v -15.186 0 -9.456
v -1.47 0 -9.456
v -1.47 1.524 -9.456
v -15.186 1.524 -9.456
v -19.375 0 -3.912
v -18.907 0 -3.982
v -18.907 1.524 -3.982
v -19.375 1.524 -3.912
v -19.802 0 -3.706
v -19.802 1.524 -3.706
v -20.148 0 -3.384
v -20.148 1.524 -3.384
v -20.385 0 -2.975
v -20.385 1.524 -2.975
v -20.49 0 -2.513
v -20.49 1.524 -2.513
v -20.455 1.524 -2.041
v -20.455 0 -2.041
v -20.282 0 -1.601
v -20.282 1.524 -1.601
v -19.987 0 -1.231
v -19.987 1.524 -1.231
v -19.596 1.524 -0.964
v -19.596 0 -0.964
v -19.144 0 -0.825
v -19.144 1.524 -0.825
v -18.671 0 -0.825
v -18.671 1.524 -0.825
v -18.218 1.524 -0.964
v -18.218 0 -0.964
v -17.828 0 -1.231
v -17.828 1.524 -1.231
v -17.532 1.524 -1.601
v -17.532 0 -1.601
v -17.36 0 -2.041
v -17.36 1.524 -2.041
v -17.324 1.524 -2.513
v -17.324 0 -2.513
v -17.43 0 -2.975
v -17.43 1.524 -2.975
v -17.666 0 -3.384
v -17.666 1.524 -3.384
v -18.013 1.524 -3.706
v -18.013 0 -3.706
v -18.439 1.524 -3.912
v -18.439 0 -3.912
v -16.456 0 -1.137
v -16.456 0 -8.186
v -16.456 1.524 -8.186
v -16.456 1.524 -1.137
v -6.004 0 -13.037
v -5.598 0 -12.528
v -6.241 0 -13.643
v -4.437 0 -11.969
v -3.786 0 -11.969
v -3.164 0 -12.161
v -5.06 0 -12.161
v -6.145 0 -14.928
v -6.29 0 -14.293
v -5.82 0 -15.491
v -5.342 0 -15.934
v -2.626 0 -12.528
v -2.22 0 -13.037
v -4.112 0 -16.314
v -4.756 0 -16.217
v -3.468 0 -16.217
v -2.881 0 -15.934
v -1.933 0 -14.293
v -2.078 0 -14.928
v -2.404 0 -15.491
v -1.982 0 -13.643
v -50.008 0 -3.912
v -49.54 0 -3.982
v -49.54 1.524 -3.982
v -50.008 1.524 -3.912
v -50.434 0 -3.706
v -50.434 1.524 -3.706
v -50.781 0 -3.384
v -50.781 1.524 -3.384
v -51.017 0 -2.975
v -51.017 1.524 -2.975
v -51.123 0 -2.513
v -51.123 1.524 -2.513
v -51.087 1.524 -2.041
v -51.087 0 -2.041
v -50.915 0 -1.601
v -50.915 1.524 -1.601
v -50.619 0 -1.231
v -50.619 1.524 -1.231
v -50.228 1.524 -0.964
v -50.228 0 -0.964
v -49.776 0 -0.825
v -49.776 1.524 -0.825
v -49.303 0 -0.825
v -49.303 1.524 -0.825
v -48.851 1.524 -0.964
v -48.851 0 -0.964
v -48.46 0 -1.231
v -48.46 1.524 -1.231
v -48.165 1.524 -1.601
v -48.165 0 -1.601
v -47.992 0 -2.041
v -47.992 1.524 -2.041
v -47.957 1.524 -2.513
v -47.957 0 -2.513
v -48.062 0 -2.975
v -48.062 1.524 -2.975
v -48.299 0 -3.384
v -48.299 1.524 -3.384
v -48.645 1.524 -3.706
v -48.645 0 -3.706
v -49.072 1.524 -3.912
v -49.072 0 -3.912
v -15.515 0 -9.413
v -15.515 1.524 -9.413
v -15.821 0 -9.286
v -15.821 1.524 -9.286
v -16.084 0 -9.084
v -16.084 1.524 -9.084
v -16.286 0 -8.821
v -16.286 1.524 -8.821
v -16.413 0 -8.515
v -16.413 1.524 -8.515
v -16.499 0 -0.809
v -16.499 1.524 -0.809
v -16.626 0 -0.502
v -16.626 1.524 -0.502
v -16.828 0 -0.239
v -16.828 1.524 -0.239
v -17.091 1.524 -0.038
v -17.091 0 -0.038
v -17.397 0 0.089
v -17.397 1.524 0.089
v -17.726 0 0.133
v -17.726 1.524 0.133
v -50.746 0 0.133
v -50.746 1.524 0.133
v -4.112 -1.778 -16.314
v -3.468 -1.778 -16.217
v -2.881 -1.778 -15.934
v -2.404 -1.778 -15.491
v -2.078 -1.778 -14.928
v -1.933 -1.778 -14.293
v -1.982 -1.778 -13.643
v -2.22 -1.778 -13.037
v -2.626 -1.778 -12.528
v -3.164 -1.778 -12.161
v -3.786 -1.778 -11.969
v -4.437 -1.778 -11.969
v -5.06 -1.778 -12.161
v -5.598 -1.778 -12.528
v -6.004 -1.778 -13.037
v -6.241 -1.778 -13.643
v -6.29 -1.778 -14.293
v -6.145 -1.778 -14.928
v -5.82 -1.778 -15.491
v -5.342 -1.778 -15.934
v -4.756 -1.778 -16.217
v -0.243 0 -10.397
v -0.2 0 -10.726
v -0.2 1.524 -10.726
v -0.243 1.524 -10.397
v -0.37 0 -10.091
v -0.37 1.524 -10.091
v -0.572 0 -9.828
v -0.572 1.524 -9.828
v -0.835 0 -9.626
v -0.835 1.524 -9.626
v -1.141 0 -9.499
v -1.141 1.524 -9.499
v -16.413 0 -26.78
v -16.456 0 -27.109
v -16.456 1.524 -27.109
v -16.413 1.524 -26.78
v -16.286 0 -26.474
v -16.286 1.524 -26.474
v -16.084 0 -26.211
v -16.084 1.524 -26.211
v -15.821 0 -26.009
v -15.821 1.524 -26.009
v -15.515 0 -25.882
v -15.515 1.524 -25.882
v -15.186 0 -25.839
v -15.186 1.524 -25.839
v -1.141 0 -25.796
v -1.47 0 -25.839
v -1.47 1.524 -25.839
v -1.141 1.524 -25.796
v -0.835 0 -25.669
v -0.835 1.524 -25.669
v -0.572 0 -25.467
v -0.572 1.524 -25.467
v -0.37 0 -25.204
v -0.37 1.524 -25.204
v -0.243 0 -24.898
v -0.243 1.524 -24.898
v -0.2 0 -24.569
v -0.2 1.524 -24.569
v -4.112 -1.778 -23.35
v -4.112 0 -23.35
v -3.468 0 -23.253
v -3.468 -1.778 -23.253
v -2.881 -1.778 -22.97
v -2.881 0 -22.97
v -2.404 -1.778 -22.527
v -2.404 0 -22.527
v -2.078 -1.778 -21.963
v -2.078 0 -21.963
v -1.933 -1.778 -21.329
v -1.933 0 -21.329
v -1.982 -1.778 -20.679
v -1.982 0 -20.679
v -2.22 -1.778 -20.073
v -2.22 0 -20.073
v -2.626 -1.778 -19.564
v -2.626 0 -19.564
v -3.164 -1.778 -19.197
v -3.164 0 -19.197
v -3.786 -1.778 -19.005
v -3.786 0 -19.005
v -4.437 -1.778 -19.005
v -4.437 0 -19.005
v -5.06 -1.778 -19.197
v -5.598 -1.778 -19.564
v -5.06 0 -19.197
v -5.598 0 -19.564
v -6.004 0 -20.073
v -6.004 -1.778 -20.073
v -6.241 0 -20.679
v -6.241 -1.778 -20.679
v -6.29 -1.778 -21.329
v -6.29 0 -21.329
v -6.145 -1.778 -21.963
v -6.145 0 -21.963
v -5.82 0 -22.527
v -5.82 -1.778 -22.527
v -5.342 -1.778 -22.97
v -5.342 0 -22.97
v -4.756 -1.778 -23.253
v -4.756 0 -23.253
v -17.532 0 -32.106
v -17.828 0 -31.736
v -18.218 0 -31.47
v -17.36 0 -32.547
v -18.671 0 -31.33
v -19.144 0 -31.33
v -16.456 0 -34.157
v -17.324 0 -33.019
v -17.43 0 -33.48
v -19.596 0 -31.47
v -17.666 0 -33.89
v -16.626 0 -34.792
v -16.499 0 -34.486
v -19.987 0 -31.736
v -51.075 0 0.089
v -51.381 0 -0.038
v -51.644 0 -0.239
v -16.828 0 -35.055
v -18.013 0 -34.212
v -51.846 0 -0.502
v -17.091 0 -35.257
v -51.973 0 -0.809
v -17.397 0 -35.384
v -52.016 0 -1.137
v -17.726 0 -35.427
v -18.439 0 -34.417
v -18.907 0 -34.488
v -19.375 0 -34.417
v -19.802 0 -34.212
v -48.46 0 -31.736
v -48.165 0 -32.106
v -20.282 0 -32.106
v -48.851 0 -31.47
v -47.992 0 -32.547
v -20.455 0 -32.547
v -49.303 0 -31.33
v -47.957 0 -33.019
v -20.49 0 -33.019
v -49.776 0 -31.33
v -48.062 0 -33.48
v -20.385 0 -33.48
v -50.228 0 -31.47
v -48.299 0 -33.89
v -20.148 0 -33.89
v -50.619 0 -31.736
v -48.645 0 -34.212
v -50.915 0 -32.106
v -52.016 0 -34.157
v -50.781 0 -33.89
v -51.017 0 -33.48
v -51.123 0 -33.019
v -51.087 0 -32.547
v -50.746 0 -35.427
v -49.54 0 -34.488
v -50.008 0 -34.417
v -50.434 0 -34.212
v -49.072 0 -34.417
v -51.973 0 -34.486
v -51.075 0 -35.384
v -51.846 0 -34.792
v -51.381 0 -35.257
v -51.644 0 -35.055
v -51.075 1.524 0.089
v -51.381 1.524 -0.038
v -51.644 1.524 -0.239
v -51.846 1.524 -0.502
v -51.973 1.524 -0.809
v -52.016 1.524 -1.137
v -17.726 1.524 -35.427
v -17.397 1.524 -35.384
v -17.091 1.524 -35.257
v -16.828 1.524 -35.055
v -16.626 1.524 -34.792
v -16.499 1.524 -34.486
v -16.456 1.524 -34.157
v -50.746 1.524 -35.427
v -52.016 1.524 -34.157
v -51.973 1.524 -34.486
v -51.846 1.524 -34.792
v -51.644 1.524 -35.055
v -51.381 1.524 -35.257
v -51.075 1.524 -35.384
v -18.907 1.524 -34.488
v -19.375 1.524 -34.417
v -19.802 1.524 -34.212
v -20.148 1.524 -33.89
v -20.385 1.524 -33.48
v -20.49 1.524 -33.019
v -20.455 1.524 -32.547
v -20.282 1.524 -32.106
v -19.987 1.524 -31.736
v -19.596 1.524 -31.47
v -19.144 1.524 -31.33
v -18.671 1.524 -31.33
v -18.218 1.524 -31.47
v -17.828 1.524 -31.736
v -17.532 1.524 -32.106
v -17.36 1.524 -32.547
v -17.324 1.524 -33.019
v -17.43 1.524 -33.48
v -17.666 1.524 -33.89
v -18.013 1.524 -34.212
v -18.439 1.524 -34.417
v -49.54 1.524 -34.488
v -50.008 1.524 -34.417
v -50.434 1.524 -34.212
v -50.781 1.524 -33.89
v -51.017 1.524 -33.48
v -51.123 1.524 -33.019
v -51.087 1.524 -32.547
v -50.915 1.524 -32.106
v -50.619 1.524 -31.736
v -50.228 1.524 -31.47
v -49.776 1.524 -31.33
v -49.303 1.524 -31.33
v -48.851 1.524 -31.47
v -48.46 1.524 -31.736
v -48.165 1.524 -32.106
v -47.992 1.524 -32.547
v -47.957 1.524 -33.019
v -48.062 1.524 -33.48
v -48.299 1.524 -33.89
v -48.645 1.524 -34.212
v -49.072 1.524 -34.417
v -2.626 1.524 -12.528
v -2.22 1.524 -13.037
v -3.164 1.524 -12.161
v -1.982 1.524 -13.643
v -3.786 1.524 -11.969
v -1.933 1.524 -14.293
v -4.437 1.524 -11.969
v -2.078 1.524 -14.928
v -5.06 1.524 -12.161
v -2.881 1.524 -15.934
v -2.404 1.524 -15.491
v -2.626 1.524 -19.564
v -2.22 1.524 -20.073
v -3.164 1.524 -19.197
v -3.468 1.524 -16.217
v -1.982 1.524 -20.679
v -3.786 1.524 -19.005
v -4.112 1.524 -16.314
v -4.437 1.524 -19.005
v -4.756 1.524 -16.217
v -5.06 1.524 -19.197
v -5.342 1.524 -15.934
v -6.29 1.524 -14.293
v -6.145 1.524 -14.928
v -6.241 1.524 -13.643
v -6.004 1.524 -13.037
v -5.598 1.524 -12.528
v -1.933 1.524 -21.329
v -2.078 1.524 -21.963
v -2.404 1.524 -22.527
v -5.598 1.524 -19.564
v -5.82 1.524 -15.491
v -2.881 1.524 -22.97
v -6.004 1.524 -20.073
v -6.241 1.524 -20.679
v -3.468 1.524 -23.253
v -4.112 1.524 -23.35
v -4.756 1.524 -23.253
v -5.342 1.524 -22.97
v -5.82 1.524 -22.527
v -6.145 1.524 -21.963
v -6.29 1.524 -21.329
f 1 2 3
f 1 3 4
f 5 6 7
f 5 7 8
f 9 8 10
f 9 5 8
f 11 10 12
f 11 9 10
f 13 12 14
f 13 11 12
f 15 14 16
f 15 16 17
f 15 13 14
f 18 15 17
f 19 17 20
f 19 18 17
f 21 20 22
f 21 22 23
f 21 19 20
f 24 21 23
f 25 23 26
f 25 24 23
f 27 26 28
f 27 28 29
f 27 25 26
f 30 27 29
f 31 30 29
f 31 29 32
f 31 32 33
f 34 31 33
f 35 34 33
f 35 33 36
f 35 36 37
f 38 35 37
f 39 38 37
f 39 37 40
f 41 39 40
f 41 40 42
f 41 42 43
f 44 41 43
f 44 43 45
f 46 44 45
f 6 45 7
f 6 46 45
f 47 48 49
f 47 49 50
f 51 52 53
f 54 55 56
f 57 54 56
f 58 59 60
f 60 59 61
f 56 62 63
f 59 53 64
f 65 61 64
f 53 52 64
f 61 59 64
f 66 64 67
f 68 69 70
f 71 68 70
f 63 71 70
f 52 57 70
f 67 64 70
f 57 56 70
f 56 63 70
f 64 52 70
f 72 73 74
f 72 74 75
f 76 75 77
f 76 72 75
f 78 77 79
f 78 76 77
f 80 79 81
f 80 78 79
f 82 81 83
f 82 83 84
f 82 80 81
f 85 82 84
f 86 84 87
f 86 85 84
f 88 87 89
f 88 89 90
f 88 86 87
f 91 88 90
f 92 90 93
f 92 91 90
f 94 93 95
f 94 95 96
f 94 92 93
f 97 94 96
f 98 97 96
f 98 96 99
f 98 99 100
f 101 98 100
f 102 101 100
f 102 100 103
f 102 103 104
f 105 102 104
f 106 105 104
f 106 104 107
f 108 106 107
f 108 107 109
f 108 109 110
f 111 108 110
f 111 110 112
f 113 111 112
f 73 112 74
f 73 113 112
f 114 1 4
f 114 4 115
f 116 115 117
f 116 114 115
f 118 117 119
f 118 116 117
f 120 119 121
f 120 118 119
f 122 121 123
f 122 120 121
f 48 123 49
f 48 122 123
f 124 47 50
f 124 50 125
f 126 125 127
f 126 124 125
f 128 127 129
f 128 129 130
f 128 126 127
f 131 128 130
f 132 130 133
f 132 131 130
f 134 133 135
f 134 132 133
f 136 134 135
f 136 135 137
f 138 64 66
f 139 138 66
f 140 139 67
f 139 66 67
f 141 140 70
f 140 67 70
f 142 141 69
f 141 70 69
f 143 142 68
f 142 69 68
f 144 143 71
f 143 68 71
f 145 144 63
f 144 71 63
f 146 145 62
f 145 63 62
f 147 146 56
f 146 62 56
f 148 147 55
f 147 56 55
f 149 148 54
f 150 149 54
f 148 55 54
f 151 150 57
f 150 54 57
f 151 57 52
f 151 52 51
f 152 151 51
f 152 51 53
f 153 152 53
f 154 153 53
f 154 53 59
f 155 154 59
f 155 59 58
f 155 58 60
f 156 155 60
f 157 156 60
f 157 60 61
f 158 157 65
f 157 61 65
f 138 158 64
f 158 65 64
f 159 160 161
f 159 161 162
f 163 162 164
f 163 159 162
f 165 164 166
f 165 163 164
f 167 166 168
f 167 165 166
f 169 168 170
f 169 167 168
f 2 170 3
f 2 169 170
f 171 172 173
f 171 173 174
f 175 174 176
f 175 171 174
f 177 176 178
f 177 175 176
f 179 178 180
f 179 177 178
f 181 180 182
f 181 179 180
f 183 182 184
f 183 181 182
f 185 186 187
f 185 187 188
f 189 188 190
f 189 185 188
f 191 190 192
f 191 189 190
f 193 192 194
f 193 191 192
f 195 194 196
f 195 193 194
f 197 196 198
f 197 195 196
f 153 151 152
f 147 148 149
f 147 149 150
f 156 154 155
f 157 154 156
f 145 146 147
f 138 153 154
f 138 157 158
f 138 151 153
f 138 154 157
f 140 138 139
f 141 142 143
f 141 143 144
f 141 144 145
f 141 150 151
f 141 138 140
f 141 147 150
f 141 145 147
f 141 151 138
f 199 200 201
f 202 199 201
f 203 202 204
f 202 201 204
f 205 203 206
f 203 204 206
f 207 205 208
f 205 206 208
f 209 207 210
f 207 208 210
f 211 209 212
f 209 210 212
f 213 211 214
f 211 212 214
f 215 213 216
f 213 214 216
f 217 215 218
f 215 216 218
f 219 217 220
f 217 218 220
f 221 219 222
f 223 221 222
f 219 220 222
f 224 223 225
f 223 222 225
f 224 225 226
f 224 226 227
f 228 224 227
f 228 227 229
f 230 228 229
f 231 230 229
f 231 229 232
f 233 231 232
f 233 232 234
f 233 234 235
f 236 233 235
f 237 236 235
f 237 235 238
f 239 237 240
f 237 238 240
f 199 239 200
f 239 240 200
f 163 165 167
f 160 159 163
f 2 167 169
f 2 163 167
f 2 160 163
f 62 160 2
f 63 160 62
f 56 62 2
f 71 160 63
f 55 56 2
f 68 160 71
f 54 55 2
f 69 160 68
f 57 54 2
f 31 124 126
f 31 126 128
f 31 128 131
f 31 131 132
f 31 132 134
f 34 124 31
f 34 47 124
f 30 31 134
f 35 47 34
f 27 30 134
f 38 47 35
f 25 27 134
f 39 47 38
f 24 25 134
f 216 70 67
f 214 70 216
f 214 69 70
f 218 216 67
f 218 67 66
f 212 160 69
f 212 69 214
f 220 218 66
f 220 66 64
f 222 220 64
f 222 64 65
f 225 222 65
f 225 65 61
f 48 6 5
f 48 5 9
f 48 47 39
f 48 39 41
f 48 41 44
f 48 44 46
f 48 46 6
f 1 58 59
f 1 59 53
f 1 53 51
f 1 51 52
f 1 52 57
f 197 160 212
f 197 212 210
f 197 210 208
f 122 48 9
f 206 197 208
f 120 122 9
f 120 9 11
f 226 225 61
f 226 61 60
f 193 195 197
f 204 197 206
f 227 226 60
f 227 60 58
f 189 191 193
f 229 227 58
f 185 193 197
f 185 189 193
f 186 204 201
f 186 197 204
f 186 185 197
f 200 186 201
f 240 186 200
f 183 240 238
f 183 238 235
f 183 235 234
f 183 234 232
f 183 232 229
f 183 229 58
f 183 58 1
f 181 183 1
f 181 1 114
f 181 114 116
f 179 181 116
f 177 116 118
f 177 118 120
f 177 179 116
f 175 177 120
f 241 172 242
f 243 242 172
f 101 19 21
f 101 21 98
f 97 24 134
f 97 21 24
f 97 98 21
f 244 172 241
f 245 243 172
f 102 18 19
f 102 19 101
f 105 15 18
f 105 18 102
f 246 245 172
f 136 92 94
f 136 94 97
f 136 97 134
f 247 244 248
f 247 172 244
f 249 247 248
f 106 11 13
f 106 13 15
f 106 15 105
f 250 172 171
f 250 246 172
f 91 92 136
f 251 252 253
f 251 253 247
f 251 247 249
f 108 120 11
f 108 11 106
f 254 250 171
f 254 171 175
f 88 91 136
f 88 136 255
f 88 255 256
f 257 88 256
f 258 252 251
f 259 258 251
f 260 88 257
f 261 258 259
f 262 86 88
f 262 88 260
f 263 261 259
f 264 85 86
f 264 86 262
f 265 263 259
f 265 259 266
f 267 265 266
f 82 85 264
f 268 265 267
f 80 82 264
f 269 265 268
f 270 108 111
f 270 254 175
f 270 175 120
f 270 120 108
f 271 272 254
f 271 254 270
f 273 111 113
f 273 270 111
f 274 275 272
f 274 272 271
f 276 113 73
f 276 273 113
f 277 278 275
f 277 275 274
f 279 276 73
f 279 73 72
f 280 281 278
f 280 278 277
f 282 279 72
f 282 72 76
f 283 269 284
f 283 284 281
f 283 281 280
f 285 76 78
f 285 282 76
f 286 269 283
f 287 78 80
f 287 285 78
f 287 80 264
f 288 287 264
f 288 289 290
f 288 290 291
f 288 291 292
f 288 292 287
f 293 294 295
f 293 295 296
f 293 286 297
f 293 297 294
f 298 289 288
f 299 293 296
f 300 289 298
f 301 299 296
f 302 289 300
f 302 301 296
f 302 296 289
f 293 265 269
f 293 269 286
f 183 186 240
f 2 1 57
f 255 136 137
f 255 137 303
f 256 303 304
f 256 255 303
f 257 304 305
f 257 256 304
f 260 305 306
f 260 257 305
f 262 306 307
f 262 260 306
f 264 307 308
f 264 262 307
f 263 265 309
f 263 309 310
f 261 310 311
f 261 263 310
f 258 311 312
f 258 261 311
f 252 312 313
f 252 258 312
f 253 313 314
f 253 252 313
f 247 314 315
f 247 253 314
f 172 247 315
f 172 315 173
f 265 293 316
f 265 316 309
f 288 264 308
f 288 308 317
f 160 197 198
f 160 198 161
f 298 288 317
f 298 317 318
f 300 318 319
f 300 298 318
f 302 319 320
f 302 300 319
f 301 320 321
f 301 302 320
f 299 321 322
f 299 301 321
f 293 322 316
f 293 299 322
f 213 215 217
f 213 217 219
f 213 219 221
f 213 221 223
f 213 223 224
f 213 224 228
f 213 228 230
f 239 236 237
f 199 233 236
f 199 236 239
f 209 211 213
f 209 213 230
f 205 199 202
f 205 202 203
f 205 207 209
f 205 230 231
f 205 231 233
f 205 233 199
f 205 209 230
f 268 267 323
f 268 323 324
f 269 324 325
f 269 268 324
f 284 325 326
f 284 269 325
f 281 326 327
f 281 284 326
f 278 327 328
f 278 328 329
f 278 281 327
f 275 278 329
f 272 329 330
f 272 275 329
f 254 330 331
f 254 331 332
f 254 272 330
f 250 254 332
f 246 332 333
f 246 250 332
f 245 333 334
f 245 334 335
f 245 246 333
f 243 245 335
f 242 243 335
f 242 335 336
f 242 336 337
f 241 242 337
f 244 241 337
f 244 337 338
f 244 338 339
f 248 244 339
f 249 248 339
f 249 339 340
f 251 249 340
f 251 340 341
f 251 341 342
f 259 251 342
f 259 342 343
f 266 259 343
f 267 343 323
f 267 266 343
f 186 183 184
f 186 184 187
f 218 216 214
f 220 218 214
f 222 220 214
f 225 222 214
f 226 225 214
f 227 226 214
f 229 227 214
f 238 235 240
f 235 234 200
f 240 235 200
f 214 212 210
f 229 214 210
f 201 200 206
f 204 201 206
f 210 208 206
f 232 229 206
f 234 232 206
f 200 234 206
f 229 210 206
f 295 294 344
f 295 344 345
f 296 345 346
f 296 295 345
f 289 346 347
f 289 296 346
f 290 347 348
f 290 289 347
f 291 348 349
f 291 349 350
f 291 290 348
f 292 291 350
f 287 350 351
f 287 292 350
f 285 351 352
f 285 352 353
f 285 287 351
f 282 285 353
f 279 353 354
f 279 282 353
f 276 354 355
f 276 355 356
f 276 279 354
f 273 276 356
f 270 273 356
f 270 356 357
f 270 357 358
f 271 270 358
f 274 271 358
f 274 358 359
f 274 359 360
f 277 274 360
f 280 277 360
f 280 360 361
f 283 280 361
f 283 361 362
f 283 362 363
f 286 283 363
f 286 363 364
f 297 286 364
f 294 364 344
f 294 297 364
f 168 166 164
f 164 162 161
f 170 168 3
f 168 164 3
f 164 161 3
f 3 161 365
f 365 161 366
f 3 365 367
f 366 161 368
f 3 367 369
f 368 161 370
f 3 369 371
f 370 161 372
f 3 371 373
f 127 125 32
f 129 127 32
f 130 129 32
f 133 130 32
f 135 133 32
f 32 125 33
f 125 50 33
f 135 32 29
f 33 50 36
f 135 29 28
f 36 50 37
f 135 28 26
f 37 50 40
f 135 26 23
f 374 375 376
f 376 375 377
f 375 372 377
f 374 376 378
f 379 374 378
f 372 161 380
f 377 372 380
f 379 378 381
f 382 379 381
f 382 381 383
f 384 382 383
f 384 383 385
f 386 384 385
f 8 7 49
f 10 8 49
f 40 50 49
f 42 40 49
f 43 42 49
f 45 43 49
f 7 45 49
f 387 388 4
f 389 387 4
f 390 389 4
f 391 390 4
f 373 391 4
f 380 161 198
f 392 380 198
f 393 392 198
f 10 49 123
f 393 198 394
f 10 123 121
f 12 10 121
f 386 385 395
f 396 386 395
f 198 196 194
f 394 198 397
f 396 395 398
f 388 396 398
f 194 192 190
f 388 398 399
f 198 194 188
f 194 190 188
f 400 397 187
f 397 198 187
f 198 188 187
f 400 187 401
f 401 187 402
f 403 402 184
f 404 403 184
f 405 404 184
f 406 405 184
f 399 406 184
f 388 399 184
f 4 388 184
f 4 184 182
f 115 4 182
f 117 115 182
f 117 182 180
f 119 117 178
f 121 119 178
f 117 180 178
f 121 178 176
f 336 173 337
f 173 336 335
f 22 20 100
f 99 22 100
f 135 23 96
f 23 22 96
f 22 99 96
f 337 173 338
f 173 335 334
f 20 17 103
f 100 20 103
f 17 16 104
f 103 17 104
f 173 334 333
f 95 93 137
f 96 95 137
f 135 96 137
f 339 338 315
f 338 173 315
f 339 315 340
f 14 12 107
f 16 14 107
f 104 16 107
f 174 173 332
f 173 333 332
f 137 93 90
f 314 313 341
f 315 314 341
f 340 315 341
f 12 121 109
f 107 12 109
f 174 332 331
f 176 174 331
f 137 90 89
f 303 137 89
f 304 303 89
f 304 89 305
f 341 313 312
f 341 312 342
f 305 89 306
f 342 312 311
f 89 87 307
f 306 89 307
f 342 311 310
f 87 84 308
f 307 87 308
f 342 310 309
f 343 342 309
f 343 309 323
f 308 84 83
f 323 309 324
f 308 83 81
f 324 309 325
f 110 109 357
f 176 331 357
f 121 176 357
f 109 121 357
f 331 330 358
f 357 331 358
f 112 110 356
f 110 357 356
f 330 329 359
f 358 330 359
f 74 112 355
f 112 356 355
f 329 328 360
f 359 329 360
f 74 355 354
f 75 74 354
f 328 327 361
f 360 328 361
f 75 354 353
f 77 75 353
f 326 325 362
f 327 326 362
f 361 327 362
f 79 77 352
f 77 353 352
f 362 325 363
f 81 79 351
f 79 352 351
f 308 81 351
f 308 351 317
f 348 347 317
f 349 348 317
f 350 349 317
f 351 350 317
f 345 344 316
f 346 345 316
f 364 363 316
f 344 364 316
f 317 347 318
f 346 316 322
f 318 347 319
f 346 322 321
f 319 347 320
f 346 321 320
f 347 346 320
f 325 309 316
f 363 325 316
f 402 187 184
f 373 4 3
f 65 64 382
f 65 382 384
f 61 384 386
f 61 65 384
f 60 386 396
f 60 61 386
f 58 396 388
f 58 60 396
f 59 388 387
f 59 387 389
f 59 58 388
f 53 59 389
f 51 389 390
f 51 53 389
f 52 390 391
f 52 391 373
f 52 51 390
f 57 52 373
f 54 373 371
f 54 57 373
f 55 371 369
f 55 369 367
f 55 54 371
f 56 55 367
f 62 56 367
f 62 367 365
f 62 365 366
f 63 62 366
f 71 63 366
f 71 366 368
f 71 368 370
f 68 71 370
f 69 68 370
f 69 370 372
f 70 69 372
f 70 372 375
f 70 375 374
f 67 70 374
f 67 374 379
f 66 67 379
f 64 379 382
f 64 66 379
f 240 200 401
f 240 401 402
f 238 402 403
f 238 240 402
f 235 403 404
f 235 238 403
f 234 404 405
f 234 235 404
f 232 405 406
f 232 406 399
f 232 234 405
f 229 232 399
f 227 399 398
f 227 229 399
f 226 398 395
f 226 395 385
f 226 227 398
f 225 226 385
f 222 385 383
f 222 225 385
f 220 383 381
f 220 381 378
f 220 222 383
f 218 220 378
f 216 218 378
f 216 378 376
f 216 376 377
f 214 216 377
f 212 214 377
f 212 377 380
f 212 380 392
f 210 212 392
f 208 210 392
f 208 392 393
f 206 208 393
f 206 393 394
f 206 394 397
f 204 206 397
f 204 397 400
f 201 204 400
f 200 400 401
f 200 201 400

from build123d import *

# Parameters (mm, degrees)
SKETCH1_R             = 1.5875
SKETCH1_R_2           = 2.1844
BOSS_EXTRUDE2_DEPTH   = 1.524
SKETCH3_R             = 2.1844
BOSS_EXTRUDE4_DEPTH   = 1.778
BOSS_EXTRUDE4_2_DEPTH = 1.778


with BuildPart() as part:
    # Sketch1 → Boss-Extrude2 (new body)
    with BuildSketch(Plane(origin=(0, 0, 0), x_dir=(1, 0, 0), z_dir=(0, 1, 0))):
        with BuildLine():
            Line((-50.746188486, 35.427401309), (-17.726188486, 35.427401309))
            ThreePointArc((-17.726188486, 35.427401309), (-16.828162874, 35.055426921), (-16.456188486, 34.157401309))
            Line((-16.456188486, 34.157401309), (-16.456188486, 27.108901309))
            ThreePointArc((-16.456188486, 27.108901309), (-16.084214098, 26.210875697), (-15.186188486, 25.838901309))
            Line((-15.186188486, 25.838901309), (-1.470188486, 25.838901309))
            ThreePointArc((-1.470188486, 25.838901309), (-0.572162874, 25.466926921), (-0.200188486, 24.568901309))
            Line((-0.200188486, 24.568901309), (-0.200188486, 10.725901309))
            ThreePointArc((-0.200188486, 10.725901309), (-0.572162874, 9.827875697), (-1.470188486, 9.455901309))
            Line((-1.470188486, 9.455901309), (-15.186188486, 9.455901309))
            ThreePointArc((-15.186188486, 9.455901309), (-16.084214098, 9.083926921), (-16.456188486, 8.185901309))
            Line((-16.456188486, 8.185901309), (-16.456188486, 1.137401309))
            ThreePointArc((-16.456188486, 1.137401309), (-16.828162874, 0.239375697), (-17.726188486, -0.132598691))
            Line((-17.726188486, -0.132598691), (-50.746188486, -0.132598691))
            ThreePointArc((-50.746188486, -0.132598691), (-51.644214098, 0.239375697), (-52.016188486, 1.137401309))
            Line((-52.016188486, 1.137401309), (-52.016188486, 34.157401309))
            ThreePointArc((-52.016188486, 34.157401309), (-51.644214098, 35.055426921), (-50.746188486, 35.427401309))
        make_face()
        with Locations(Location((-49.539688486, 32.900101309, 0), (0, 0, 90))):
            Circle(SKETCH1_R, mode=Mode.SUBTRACT)
        with Locations(Location((-18.907288486, 32.900101309, 0), (0, 0, 90))):
            Circle(SKETCH1_R, mode=Mode.SUBTRACT)
        with Locations(Location((-18.907288486, 2.394701309, 0), (0, 0, 90))):
            Circle(SKETCH1_R, mode=Mode.SUBTRACT)
        with Locations(Location((-49.539688486, 2.394701309, 0), (0, 0, 90))):
            Circle(SKETCH1_R, mode=Mode.SUBTRACT)
        with Locations(Location((-4.111788486, 21.165301309, 0), (0, 0, 90))):
            Circle(SKETCH1_R_2, mode=Mode.SUBTRACT)
        with Locations(Location((-4.111788486, 14.129501309, 0), (0, 0, 90))):
            Circle(SKETCH1_R_2, mode=Mode.SUBTRACT)
    extrude(amount=BOSS_EXTRUDE2_DEPTH)


with BuildPart() as body_2:
    # Sketch3 → Boss-Extrude4 (new body)
    with BuildSketch(Plane.XZ):
        with Locations(Location((-4.111788486, -14.129501309, 0), (0, 0, 270))):
            Circle(SKETCH3_R)
    extrude(amount=BOSS_EXTRUDE4_DEPTH)


with BuildPart() as body_3:
    # Sketch3 → Boss-Extrude4 2 (new body)
    with BuildSketch(Plane.XZ):
        with Locations(Location((-4.111788486, -21.165301309, 0), (0, 0, 270))):
            Circle(SKETCH3_R)
    extrude(amount=BOSS_EXTRUDE4_2_DEPTH)


solid = Compound([part.part, body_2.part, body_3.part])
